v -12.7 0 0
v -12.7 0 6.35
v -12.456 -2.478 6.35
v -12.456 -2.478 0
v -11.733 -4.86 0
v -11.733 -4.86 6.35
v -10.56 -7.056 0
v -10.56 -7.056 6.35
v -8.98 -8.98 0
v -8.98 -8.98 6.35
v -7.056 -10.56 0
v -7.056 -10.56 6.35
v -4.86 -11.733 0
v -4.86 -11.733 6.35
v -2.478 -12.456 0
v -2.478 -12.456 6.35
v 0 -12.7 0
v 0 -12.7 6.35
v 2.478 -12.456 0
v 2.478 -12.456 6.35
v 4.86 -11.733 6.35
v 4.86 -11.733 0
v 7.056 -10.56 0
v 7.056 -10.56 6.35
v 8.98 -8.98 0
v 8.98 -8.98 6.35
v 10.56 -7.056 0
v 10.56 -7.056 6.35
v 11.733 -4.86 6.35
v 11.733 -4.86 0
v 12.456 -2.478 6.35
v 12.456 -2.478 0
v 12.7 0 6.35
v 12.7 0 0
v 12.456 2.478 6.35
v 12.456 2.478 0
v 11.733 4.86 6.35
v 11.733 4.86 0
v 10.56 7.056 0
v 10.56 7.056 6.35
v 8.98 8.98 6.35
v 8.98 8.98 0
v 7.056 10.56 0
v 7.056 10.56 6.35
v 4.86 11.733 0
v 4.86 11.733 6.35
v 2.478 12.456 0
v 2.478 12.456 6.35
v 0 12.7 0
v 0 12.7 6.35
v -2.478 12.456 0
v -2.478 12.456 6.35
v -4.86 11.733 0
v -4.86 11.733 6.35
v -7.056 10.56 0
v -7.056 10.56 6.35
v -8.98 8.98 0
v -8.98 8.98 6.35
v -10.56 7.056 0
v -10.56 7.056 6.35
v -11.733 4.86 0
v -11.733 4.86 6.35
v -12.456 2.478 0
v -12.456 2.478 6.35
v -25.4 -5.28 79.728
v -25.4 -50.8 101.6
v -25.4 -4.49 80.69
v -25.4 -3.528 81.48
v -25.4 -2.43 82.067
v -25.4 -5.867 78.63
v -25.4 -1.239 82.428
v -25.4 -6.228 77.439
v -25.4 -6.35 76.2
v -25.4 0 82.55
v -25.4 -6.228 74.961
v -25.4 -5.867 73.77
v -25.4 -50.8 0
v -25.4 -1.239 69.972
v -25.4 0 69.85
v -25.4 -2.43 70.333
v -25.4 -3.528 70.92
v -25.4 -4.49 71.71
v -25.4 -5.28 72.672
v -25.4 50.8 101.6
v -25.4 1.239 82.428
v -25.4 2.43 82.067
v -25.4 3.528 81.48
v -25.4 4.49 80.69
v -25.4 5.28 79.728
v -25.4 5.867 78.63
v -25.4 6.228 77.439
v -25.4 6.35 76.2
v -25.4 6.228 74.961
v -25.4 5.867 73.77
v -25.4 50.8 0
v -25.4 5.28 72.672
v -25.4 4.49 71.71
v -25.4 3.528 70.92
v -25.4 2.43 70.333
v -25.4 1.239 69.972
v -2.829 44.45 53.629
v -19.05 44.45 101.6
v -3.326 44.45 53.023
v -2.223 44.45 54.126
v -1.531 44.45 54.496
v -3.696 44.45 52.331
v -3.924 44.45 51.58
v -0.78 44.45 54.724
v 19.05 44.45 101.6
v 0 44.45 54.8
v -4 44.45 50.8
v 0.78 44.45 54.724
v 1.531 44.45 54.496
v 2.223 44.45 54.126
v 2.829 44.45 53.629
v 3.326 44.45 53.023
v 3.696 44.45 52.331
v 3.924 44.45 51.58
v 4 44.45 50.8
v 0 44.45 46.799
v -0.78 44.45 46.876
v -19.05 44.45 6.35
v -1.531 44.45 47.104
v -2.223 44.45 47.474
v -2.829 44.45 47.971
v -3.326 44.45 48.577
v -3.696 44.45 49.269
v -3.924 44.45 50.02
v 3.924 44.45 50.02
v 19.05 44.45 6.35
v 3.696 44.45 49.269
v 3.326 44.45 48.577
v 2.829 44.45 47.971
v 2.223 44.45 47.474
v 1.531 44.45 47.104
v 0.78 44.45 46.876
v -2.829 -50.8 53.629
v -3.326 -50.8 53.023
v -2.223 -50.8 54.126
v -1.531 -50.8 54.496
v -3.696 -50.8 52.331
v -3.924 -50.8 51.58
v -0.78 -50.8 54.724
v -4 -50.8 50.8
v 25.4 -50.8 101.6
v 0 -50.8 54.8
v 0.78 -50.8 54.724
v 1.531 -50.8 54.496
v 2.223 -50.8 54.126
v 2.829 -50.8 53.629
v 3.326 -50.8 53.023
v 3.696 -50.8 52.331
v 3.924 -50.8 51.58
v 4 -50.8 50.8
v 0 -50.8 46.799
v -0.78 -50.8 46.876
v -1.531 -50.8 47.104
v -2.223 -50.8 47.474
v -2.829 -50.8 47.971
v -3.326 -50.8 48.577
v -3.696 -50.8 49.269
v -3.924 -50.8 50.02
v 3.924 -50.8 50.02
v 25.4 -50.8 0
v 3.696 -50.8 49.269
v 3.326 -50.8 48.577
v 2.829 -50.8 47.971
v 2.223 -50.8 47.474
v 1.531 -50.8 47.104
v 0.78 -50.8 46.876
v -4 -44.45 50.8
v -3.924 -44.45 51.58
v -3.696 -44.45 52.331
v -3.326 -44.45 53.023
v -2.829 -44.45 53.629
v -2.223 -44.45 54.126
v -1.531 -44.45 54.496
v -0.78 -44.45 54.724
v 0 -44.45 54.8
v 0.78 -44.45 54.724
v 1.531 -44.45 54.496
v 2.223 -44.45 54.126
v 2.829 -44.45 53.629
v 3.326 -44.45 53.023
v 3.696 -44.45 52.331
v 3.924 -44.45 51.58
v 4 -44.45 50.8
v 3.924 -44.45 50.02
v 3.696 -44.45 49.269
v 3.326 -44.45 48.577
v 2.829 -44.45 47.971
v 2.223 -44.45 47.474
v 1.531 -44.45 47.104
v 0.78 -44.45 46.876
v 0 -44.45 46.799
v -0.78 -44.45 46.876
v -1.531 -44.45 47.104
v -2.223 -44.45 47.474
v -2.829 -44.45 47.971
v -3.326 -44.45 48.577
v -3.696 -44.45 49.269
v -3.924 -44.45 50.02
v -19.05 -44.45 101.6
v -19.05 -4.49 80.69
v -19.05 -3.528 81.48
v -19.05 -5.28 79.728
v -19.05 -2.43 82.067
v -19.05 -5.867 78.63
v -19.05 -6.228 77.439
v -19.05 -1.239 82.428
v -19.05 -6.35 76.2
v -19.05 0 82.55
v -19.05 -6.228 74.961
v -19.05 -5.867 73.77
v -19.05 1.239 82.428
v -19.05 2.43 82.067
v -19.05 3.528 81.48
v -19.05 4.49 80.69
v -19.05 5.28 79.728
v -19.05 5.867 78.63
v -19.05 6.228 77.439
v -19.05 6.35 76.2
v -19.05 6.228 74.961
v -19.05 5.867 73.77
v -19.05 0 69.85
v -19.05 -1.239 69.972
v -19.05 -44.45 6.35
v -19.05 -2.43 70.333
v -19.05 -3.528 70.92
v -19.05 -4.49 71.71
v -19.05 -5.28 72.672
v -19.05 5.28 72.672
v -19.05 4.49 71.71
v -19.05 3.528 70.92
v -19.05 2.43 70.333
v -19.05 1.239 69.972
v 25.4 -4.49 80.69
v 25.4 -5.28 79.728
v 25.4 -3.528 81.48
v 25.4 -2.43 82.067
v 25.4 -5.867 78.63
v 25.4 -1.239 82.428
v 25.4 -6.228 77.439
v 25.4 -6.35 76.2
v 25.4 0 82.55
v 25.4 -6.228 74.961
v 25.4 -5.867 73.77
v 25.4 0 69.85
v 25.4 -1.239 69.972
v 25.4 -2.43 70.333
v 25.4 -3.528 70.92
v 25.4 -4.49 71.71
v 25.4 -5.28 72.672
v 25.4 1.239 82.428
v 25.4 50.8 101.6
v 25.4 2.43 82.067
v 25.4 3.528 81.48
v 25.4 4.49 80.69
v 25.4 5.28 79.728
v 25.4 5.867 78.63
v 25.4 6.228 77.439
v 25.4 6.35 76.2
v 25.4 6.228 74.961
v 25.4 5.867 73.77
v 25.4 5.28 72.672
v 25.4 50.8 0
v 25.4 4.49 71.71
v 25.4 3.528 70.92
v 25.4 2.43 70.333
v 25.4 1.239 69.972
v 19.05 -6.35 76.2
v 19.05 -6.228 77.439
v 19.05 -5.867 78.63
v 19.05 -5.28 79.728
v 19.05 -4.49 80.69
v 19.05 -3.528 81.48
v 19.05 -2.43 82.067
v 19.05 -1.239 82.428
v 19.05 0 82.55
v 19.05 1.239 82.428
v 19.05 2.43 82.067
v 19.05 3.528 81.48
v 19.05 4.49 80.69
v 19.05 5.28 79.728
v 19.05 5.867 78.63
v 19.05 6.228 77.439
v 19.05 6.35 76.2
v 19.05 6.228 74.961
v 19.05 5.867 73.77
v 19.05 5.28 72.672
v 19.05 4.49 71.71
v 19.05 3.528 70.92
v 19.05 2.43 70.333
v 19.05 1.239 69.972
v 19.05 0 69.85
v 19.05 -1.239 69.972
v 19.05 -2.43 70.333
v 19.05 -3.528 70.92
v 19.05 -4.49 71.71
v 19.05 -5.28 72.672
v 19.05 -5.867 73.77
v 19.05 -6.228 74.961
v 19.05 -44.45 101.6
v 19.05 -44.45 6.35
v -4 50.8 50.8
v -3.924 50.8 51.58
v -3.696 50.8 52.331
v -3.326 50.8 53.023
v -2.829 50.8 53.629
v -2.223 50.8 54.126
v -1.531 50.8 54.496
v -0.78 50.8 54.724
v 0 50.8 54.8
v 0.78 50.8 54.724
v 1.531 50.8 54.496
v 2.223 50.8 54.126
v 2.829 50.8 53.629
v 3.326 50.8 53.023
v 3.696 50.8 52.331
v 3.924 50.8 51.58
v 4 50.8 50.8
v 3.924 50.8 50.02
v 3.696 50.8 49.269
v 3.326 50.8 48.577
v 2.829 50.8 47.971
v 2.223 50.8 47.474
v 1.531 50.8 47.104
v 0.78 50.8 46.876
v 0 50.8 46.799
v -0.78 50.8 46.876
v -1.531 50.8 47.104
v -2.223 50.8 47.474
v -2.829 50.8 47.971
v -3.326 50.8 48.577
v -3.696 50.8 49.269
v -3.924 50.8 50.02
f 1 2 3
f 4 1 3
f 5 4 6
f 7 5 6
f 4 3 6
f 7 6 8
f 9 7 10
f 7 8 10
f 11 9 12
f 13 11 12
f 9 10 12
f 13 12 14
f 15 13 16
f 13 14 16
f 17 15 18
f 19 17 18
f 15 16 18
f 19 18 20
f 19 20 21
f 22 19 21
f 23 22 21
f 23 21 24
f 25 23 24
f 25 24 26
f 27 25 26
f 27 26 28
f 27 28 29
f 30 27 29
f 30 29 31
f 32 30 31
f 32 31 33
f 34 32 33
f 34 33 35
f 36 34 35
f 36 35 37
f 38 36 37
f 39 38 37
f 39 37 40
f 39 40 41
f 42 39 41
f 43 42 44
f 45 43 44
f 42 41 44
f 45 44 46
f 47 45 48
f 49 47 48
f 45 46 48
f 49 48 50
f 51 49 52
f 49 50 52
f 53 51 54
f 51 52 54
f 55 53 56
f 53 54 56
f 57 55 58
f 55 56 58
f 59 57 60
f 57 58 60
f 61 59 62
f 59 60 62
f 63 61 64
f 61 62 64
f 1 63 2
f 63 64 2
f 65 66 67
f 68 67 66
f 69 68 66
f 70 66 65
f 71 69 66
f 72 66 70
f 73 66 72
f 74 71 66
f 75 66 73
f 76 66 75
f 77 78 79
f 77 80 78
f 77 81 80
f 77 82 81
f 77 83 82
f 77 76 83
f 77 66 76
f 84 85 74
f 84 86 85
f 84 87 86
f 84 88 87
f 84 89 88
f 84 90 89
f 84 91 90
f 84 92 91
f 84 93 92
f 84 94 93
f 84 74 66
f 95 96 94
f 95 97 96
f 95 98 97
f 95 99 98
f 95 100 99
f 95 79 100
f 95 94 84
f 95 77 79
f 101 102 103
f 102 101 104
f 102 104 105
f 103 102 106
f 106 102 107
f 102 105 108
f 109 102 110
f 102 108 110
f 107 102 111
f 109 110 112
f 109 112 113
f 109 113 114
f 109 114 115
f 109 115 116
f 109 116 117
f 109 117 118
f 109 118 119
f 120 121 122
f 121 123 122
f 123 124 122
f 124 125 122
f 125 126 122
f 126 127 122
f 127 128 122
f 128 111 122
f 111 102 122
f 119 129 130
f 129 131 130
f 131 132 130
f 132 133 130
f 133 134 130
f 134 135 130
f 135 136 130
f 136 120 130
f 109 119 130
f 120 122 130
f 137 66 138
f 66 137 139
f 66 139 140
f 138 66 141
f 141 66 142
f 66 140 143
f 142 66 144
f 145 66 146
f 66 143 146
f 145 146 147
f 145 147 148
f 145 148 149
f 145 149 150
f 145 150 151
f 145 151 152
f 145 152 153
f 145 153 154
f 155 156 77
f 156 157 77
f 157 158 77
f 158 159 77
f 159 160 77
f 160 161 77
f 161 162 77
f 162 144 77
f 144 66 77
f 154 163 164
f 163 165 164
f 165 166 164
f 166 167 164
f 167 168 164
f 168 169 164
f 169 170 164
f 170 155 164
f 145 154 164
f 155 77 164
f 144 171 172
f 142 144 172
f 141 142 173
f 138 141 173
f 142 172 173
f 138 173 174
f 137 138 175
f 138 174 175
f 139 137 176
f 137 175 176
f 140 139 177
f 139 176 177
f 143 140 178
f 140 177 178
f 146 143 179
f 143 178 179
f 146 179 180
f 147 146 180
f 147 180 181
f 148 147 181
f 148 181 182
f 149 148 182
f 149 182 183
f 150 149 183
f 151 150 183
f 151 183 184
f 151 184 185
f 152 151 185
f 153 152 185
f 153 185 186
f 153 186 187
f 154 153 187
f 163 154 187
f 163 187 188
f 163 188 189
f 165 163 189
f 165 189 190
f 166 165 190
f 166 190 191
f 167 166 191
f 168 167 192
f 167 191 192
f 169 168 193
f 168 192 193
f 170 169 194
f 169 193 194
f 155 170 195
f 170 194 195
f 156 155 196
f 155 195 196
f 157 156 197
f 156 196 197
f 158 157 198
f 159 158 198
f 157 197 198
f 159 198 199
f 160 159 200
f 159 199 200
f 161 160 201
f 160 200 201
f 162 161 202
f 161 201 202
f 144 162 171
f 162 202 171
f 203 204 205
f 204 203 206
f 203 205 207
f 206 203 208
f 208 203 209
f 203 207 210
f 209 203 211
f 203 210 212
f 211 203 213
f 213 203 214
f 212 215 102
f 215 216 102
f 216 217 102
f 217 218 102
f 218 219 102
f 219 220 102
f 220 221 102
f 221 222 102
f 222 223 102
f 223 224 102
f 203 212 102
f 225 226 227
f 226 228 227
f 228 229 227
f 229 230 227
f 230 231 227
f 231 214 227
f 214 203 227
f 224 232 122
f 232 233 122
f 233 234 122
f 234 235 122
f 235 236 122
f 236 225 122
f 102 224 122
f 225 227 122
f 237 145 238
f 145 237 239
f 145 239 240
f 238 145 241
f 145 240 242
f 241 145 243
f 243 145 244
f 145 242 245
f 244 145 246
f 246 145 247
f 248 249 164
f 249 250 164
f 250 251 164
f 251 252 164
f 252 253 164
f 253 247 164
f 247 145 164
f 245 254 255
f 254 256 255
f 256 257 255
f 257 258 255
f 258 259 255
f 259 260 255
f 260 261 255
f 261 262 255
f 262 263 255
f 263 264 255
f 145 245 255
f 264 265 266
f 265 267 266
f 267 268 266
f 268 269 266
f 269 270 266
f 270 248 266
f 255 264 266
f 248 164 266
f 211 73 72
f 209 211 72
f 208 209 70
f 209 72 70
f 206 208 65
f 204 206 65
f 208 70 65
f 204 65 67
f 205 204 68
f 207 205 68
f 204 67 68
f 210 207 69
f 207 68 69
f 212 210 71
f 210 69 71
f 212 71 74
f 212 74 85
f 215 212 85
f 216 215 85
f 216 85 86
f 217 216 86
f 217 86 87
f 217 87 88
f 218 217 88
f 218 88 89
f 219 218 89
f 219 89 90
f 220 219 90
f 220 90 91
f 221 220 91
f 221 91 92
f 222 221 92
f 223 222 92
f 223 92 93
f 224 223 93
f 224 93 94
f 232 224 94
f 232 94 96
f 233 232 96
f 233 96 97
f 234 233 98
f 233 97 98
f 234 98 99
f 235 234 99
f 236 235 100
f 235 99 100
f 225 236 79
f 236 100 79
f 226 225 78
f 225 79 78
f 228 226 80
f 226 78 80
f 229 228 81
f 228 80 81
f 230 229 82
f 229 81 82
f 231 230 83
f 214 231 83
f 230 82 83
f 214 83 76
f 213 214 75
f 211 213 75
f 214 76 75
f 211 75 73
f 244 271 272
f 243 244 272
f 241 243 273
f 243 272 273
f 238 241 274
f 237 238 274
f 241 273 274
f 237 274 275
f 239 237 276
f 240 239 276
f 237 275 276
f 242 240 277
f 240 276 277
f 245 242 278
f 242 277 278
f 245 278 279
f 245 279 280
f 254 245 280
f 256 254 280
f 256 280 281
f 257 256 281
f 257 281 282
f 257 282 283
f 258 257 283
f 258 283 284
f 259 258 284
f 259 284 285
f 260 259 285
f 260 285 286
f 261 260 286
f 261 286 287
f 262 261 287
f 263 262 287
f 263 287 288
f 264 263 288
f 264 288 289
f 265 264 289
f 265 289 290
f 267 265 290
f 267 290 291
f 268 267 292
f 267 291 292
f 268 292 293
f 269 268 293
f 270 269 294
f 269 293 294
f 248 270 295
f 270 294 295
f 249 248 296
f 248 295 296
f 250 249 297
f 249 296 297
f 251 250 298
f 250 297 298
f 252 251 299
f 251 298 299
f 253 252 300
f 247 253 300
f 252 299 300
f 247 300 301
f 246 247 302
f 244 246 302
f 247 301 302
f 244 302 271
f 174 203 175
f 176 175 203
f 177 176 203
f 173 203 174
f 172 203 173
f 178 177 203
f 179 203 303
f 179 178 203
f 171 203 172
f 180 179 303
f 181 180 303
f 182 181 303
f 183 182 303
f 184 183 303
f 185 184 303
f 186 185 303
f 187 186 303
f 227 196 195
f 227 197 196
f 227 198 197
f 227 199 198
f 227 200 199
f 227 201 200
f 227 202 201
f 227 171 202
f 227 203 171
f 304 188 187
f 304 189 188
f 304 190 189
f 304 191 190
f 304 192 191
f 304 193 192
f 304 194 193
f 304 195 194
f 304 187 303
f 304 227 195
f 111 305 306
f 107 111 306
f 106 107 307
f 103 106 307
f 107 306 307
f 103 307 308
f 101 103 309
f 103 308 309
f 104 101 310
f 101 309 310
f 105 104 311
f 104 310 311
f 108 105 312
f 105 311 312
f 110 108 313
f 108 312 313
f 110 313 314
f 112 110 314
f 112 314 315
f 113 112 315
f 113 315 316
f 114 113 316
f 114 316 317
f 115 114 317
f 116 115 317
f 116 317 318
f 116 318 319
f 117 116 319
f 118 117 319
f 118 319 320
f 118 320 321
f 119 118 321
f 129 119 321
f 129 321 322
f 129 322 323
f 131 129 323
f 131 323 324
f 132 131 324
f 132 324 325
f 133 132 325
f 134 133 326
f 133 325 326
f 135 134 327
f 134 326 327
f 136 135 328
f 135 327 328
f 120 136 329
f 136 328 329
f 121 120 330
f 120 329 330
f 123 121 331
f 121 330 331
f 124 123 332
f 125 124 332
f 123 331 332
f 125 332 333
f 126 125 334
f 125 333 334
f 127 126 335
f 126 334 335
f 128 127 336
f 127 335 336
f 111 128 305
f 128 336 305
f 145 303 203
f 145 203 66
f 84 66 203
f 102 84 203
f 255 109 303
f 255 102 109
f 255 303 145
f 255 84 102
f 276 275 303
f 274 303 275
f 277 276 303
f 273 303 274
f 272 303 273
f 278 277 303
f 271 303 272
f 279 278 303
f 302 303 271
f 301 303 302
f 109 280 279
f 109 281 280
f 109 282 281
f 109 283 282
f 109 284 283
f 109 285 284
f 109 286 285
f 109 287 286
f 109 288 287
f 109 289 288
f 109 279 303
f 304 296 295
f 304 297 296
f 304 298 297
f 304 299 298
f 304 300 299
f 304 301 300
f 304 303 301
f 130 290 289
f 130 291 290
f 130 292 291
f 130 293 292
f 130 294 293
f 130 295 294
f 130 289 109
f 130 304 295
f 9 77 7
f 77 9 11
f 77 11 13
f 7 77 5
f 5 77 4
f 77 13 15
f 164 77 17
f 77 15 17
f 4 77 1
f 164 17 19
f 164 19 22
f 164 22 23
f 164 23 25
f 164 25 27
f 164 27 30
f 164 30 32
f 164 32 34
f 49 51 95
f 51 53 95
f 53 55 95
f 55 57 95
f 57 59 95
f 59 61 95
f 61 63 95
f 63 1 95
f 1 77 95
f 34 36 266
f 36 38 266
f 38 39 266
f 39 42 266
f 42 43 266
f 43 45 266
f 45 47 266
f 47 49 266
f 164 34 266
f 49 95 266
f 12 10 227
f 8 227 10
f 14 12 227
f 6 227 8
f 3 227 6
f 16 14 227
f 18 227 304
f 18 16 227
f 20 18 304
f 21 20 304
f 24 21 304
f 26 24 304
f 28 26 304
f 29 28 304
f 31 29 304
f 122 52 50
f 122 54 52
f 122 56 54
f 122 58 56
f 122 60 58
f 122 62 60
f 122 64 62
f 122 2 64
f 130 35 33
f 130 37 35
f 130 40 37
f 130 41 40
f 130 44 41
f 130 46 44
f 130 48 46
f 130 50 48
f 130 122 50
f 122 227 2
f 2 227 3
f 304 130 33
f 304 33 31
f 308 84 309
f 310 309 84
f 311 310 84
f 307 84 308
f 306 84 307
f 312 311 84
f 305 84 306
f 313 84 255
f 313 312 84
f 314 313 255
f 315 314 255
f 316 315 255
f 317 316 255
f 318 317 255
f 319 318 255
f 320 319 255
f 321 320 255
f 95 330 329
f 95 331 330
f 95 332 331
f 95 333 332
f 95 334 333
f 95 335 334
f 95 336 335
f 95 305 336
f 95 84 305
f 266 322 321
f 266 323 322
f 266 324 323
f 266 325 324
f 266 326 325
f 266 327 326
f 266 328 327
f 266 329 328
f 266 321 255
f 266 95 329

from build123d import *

# Parameters (mm, degrees)
F0_W     = 50.8
F0_H     = 101.6
F1_DEPTH = 101.6
F2_T     = -6.35
F4_D     = 12.7
F6_D     = 25.4
F6_DEPTH = 25.4
F8_D     = 8.001


with BuildPart() as f1:
    # F0 (on Top) → F1 (new body)
    with BuildSketch(Plane.XY):
        Rectangle(F0_W, F0_H)
    extrude(amount=F1_DEPTH)

    # F2
    f2_openings = [f1.faces().sort_by_distance(p)[0] for p in [
        (0, 0, 101.6),
    ]]
    offset(amount=F2_T, openings=f2_openings)

    # F4 (through all)
    with Locations(Plane.YZ.offset(25.4)):
        with Locations((0, 76.2)):
            Hole(F4_D / 2)

    # F6
    with Locations(Plane(origin=(0, 0, 0), x_dir=(1, 0, 0), z_dir=(0, 0, -1))):
        with Locations((0, 0)):
            Hole(F6_D / 2, depth=F6_DEPTH)

    # F8 (through all)
    with Locations(Plane.XZ.offset(50.8)):
        with Locations((0, 50.8)):
            Hole(F8_D / 2)


solid = f1.part
